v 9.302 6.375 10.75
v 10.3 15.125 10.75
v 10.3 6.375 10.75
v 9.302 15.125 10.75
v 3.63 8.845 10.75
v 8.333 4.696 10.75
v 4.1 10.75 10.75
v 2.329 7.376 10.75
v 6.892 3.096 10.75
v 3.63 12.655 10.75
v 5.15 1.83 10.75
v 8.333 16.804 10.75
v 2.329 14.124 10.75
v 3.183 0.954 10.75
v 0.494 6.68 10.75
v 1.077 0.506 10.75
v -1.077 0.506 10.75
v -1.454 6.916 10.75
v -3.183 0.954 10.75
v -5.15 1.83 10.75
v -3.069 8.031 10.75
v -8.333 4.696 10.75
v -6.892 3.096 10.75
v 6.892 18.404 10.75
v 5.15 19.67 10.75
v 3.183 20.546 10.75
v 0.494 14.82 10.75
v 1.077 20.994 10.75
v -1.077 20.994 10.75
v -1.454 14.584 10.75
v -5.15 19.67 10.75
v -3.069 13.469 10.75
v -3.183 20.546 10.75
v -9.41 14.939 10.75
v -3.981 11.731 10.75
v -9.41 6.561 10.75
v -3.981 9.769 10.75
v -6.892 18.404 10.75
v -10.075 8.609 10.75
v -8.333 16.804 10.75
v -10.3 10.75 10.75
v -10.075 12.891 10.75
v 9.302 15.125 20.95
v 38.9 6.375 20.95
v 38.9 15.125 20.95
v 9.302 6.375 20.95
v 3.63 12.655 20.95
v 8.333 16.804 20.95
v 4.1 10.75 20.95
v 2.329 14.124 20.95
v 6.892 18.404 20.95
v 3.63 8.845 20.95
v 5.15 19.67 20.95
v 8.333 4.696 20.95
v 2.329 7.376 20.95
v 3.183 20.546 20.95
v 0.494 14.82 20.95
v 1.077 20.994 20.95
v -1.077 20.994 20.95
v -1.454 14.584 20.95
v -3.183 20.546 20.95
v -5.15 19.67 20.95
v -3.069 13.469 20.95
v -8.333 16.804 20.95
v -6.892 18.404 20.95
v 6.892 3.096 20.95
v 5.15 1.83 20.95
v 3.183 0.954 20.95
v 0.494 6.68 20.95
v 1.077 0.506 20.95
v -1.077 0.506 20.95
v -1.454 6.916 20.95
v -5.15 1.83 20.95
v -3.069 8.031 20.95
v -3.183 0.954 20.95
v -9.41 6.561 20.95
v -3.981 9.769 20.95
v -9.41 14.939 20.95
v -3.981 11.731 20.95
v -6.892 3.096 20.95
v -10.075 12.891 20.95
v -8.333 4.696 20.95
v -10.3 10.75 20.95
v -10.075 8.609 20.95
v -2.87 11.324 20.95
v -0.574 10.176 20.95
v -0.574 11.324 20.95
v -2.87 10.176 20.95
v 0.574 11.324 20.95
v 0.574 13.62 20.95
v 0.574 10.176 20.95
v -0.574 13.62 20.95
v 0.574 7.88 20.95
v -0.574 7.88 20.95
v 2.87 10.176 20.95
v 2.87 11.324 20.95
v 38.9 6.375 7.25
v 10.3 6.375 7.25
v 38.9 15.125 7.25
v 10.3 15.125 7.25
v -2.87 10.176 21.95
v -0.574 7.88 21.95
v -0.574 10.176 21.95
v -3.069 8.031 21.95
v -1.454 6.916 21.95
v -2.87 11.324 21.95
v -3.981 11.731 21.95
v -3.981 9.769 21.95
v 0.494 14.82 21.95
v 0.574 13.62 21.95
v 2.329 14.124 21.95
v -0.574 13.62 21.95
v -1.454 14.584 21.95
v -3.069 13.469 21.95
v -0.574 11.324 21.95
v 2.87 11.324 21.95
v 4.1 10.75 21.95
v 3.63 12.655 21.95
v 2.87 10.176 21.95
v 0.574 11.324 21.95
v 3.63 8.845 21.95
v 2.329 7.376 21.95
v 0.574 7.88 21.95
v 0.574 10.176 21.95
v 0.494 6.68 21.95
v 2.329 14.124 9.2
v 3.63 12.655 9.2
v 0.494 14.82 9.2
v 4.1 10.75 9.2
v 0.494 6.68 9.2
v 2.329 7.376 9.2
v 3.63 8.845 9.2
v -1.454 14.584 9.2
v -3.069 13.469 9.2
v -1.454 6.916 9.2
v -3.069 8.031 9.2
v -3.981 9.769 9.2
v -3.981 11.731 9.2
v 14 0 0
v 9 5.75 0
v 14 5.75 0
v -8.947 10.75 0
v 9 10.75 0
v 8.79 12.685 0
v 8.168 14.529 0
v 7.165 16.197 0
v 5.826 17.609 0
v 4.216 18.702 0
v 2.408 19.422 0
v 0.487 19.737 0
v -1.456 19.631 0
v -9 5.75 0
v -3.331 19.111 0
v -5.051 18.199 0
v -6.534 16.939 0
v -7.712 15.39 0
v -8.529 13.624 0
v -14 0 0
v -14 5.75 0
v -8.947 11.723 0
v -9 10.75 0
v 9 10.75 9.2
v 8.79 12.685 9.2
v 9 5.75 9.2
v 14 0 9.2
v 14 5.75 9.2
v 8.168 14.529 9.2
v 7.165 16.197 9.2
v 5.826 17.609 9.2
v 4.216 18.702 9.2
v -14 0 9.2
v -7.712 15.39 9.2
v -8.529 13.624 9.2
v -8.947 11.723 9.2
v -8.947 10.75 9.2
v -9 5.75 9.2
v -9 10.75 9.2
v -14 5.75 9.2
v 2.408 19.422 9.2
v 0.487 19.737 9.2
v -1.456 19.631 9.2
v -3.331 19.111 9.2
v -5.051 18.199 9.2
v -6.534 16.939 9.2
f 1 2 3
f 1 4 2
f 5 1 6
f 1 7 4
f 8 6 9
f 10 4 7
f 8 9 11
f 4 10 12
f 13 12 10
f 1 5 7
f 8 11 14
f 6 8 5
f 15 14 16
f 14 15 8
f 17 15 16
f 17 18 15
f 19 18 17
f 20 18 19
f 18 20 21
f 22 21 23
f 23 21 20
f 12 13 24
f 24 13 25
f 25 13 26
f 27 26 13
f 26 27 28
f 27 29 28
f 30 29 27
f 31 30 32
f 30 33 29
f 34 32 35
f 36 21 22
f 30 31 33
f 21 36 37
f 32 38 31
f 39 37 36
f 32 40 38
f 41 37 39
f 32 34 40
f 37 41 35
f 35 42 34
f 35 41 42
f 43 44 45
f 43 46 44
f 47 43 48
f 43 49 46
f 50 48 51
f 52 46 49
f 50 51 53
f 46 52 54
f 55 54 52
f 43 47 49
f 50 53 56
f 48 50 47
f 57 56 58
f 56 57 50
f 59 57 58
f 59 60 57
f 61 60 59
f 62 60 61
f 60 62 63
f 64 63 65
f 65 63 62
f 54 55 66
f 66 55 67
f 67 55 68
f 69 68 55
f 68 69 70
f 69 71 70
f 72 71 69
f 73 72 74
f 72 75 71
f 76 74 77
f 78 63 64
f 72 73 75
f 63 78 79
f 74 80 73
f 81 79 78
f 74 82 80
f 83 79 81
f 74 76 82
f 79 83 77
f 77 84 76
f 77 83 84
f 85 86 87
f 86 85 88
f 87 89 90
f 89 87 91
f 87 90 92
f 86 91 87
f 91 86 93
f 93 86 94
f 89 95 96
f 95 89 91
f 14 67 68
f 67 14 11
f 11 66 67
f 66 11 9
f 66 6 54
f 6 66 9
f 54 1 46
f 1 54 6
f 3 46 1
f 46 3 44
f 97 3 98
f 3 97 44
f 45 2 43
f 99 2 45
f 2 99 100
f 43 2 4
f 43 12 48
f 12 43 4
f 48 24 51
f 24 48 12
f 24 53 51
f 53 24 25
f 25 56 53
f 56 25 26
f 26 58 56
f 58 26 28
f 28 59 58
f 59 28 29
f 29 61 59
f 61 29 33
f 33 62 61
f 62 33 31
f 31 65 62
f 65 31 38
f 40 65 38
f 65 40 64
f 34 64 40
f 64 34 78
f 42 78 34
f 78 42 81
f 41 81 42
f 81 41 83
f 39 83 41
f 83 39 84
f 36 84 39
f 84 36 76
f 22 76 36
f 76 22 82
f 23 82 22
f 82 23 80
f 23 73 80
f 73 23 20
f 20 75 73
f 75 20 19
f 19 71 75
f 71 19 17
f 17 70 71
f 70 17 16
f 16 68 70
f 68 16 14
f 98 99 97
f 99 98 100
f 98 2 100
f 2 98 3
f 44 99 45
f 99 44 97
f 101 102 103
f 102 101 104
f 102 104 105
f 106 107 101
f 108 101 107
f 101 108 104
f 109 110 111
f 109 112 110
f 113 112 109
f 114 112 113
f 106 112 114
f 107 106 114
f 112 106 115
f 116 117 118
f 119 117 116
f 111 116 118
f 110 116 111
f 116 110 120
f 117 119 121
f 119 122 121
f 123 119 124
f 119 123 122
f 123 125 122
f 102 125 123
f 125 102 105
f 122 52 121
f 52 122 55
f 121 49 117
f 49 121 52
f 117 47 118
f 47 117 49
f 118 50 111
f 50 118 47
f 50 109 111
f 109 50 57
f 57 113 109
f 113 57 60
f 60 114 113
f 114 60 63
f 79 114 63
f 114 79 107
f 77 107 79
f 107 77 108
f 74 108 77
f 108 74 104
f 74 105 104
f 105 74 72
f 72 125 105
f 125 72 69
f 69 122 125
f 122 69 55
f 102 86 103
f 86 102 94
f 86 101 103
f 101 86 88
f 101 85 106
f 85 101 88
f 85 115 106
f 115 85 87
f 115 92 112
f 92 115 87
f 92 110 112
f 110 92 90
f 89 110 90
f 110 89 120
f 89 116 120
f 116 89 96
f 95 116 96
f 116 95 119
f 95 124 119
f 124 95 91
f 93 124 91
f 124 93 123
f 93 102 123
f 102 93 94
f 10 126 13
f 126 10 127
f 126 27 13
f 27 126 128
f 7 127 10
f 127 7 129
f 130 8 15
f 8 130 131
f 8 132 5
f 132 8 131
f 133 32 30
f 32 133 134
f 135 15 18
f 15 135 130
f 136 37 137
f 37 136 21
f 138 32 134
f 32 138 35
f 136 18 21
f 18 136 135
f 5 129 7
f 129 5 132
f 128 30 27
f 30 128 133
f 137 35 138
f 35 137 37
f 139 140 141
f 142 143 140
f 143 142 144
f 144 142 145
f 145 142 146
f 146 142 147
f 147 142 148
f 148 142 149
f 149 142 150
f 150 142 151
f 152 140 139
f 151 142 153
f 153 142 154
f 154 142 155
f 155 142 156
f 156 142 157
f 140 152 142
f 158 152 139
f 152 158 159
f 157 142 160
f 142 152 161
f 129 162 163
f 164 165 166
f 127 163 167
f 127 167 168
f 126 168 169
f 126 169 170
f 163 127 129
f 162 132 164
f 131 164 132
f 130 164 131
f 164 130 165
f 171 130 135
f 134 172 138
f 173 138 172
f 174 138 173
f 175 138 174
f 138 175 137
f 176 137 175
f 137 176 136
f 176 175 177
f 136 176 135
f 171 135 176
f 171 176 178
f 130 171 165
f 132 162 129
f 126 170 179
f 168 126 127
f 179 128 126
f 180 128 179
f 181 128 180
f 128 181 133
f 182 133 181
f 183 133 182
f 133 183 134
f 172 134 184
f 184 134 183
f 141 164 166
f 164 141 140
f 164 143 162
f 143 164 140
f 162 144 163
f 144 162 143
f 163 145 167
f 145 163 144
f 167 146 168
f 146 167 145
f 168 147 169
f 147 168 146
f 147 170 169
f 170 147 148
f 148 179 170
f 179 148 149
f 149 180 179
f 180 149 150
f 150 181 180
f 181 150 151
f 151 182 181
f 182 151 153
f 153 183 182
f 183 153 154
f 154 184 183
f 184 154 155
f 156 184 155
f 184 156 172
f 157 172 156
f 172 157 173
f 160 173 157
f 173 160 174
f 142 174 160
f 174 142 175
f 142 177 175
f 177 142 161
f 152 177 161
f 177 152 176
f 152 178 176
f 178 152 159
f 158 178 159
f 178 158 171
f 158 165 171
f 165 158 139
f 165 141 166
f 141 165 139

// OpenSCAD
// file: ieq30pro-dimensions.scad
// Units: mm

cast_iron_color = "gray";//"beige";
plastic_color = [0.1,0.1,0.1];

////////////////////////////////////////////////////
// Diameter of dec body at bottom, near CW shaft.
dec1_diam = 67.66;
dec1_radius = dec1_diam / 2;

// Length of declination cylinder with dec1_diam.
dec1_len = 131.9;

// The black cap and the bottom of the dec body, where
// the counterweight shaft is attached.
cw_cap_height = 10;
cw_cap_bevel_height = 5;

// There is a countersink in the bottom of the DEC
// body to allow for the counterweight shaft.
cw_cs_diam = 23;
cw_cs_radius = cw_cs_diam / 2;

cw_thread_diam = 16;
cw_thread_radius = cw_thread_diam / 2;

////////////////////////////////////////////////////
// Diameter of the motor end of the DEC body.

dec2_diam = 97.4;  // +/- 0.3mm.
dec2_radius = dec2_diam / 2;
dec2_len = 25.4;

////////////////////////////////////////////////////
// Declination motor cover size.
dec_motor_w = 85.4;  // left-right on face with logo.
dec_motor_h = 68.4;  // up-down on face with logo.
dec_motor_z = 62.4;

////////////////////////////////////////////////////
// Min dist from face with logo to dec1 cylinder.
dec_motor_z2 = 42;
dec_motor_z_offset =
  dec1_radius + dec_motor_z2 - dec_motor_z;

////////////////////////////////////////////////////
// RA axis diameter at the bearing, where the moving
// and stationary parts meet.
ra1_diam = 120;  // +/- 0.3mm.
ra1_radius = ra1_diam / 2;

////////////////////////////////////////////////////
// Distance from edge of RA bearing to outside and
// center of DEC axis.
ra1_base_to_dec = 21.5;
ra1_base_to_dec_center = ra1_base_to_dec + dec1_radius;

////////////////////////////////////////////////////
// Dimensions for the non-moving portion of the
// mount. Much less detail is needed here, so only
// a few objects are modeled.

// RA bearing cover diameter and length.
ra2_radius = ra1_radius;
ra2_len = 24.5;

// RA body becomes narrower.
ra3_radius = ra2_radius - 19.86;
ra3_len = 17.13;

ra_bearing_gap = 0.6;

// Functions to enable access from other files
// that "use" this file.
function ra_cover_radius() = ra1_radius;
function dec_cover_radius() = dec2_radius;

////////////////////////////////////////////////////
// Dimensions for the DEC and RA clutches. They are
// mostly identical, except that the DEC clutch
// sticks out farther from the DEC head and its
// screw axis is a bit closer to the bearing gap.
// The model won't include the draft angle of the
// handle.

clutch_flange_width = 28;
clutch_flange_height = 5.75;
clutch_extrusion = 9.2; // from casting diam.
clutch_base_diameter = 18;
clutch_base_height = 19.75;
clutch_screw_length = 10.75; // casting to head.
clutch_screw_head_diam = 8.2;
clutch_handle_base_diam = 20.6;
clutch_handle_length = 38.9; // screw center to end.
clutch_handle_width = 8.75; // At widest.
clutch_handle_depth1 = 10.2;
clutch_handle_depth2 = 13.7;

////////////////////////////////////////////////////
// Dimensions for the DEC head (i.e. the part
// rotated by the DEC motor, which has the dove tail
// saddle for holding the telescope).

dec_head_base_diam = 97.66;
dec_head_base_height = 3.83;
dec_head_height = 46.3;  // Above base.
dec_head_diam1 = 89.5;  // At top of base.
dec_head_diam2 = 86.9;  // At top, due to draft angle.
dec_head_scale = dec_head_diam2 / dec_head_diam1;
dec_saddle_depth = 13.8;
dec_saddle_width1 = 43.95; // At top of saddle
dec_saddle_width2 = 46.66; // At bottom of saddle
dovetail_width = 45.25;
dec_slot_corner_radius = 5;
dec_slot_width = 60.4;
dec_slot_len = 25.6;
dec_head_square = 76;
dec_head_clamp_screw_diam = 7.8;  // OD
dec_head_clamp_screw_depth = 6.66;  // Top to centerline.
dec_head_clamp_screw_spacing = 44.4; 
// main file
include <ieq30pro-dimensions.scad>

clutch();

module clutch(handle_angle=0) {
  r = clutch_base_diameter/2;
  raise_by = clutch_base_height - r;
  translate([0,raise_by,0]) {
    // Extrusion out of the base
    color(cast_iron_color)
      clutch_base();

    // Handle, shaft and screw.
    translate([0,0,clutch_screw_length])
      rotate([0, 0, handle_angle])
        clutch_handle();
  };
};

module clutch_base(handle_angle) {
  linear_extrude(height=clutch_extrusion)
    union() {
      r = clutch_base_diameter/2;
      circle(r=r);

      w1 = clutch_flange_width;
      h1 = clutch_flange_height;
      w2 = clutch_base_diameter;
      h2 = clutch_base_height - r;

      translate([-w1/2, -h2, 0])
        square([w1,h1]);

      translate([-w2/2, -h2, 0])
        square([w2,h2]);
    };
};

module clutch_handle() {
  color(plastic_color) {
    radius = clutch_handle_base_diam / 2;
    hw = clutch_handle_width / 2;
    linear_extrude(height=clutch_handle_depth1)
      union() {
        circle(r=radius);
        translate([0,-hw])
          square([clutch_handle_length,
                  clutch_handle_width]);
      };

    len2 = clutch_handle_length - radius;
    drop = clutch_handle_depth2-clutch_handle_depth1;
    translate([0,0,-drop])
      linear_extrude(height=clutch_handle_depth2)
        translate([radius,-hw])
          square([len2, clutch_handle_width]);
  };
  
  // The screw head, mostly for decoration.
  color("silver") {
    r = clutch_screw_head_diam/2;
    w = r * 1.4;
    h = w/5;
    translate([0,0,clutch_handle_depth1])
      linear_extrude(height=1)
        difference() {
          circle(r=r);
          square([w,h], center=true);
          square([h,w], center=true);
        }
  };

  // The shaft that is rotated by the handle,
  // of which a little is visible between the
  // handle and the body of the axis.
  color("gold") {
    r = clutch_screw_head_diam/2;
    h = 10;
    translate([0,0, -(h-1)])
      linear_extrude(height=h)
        circle(r=r);
  }
};
